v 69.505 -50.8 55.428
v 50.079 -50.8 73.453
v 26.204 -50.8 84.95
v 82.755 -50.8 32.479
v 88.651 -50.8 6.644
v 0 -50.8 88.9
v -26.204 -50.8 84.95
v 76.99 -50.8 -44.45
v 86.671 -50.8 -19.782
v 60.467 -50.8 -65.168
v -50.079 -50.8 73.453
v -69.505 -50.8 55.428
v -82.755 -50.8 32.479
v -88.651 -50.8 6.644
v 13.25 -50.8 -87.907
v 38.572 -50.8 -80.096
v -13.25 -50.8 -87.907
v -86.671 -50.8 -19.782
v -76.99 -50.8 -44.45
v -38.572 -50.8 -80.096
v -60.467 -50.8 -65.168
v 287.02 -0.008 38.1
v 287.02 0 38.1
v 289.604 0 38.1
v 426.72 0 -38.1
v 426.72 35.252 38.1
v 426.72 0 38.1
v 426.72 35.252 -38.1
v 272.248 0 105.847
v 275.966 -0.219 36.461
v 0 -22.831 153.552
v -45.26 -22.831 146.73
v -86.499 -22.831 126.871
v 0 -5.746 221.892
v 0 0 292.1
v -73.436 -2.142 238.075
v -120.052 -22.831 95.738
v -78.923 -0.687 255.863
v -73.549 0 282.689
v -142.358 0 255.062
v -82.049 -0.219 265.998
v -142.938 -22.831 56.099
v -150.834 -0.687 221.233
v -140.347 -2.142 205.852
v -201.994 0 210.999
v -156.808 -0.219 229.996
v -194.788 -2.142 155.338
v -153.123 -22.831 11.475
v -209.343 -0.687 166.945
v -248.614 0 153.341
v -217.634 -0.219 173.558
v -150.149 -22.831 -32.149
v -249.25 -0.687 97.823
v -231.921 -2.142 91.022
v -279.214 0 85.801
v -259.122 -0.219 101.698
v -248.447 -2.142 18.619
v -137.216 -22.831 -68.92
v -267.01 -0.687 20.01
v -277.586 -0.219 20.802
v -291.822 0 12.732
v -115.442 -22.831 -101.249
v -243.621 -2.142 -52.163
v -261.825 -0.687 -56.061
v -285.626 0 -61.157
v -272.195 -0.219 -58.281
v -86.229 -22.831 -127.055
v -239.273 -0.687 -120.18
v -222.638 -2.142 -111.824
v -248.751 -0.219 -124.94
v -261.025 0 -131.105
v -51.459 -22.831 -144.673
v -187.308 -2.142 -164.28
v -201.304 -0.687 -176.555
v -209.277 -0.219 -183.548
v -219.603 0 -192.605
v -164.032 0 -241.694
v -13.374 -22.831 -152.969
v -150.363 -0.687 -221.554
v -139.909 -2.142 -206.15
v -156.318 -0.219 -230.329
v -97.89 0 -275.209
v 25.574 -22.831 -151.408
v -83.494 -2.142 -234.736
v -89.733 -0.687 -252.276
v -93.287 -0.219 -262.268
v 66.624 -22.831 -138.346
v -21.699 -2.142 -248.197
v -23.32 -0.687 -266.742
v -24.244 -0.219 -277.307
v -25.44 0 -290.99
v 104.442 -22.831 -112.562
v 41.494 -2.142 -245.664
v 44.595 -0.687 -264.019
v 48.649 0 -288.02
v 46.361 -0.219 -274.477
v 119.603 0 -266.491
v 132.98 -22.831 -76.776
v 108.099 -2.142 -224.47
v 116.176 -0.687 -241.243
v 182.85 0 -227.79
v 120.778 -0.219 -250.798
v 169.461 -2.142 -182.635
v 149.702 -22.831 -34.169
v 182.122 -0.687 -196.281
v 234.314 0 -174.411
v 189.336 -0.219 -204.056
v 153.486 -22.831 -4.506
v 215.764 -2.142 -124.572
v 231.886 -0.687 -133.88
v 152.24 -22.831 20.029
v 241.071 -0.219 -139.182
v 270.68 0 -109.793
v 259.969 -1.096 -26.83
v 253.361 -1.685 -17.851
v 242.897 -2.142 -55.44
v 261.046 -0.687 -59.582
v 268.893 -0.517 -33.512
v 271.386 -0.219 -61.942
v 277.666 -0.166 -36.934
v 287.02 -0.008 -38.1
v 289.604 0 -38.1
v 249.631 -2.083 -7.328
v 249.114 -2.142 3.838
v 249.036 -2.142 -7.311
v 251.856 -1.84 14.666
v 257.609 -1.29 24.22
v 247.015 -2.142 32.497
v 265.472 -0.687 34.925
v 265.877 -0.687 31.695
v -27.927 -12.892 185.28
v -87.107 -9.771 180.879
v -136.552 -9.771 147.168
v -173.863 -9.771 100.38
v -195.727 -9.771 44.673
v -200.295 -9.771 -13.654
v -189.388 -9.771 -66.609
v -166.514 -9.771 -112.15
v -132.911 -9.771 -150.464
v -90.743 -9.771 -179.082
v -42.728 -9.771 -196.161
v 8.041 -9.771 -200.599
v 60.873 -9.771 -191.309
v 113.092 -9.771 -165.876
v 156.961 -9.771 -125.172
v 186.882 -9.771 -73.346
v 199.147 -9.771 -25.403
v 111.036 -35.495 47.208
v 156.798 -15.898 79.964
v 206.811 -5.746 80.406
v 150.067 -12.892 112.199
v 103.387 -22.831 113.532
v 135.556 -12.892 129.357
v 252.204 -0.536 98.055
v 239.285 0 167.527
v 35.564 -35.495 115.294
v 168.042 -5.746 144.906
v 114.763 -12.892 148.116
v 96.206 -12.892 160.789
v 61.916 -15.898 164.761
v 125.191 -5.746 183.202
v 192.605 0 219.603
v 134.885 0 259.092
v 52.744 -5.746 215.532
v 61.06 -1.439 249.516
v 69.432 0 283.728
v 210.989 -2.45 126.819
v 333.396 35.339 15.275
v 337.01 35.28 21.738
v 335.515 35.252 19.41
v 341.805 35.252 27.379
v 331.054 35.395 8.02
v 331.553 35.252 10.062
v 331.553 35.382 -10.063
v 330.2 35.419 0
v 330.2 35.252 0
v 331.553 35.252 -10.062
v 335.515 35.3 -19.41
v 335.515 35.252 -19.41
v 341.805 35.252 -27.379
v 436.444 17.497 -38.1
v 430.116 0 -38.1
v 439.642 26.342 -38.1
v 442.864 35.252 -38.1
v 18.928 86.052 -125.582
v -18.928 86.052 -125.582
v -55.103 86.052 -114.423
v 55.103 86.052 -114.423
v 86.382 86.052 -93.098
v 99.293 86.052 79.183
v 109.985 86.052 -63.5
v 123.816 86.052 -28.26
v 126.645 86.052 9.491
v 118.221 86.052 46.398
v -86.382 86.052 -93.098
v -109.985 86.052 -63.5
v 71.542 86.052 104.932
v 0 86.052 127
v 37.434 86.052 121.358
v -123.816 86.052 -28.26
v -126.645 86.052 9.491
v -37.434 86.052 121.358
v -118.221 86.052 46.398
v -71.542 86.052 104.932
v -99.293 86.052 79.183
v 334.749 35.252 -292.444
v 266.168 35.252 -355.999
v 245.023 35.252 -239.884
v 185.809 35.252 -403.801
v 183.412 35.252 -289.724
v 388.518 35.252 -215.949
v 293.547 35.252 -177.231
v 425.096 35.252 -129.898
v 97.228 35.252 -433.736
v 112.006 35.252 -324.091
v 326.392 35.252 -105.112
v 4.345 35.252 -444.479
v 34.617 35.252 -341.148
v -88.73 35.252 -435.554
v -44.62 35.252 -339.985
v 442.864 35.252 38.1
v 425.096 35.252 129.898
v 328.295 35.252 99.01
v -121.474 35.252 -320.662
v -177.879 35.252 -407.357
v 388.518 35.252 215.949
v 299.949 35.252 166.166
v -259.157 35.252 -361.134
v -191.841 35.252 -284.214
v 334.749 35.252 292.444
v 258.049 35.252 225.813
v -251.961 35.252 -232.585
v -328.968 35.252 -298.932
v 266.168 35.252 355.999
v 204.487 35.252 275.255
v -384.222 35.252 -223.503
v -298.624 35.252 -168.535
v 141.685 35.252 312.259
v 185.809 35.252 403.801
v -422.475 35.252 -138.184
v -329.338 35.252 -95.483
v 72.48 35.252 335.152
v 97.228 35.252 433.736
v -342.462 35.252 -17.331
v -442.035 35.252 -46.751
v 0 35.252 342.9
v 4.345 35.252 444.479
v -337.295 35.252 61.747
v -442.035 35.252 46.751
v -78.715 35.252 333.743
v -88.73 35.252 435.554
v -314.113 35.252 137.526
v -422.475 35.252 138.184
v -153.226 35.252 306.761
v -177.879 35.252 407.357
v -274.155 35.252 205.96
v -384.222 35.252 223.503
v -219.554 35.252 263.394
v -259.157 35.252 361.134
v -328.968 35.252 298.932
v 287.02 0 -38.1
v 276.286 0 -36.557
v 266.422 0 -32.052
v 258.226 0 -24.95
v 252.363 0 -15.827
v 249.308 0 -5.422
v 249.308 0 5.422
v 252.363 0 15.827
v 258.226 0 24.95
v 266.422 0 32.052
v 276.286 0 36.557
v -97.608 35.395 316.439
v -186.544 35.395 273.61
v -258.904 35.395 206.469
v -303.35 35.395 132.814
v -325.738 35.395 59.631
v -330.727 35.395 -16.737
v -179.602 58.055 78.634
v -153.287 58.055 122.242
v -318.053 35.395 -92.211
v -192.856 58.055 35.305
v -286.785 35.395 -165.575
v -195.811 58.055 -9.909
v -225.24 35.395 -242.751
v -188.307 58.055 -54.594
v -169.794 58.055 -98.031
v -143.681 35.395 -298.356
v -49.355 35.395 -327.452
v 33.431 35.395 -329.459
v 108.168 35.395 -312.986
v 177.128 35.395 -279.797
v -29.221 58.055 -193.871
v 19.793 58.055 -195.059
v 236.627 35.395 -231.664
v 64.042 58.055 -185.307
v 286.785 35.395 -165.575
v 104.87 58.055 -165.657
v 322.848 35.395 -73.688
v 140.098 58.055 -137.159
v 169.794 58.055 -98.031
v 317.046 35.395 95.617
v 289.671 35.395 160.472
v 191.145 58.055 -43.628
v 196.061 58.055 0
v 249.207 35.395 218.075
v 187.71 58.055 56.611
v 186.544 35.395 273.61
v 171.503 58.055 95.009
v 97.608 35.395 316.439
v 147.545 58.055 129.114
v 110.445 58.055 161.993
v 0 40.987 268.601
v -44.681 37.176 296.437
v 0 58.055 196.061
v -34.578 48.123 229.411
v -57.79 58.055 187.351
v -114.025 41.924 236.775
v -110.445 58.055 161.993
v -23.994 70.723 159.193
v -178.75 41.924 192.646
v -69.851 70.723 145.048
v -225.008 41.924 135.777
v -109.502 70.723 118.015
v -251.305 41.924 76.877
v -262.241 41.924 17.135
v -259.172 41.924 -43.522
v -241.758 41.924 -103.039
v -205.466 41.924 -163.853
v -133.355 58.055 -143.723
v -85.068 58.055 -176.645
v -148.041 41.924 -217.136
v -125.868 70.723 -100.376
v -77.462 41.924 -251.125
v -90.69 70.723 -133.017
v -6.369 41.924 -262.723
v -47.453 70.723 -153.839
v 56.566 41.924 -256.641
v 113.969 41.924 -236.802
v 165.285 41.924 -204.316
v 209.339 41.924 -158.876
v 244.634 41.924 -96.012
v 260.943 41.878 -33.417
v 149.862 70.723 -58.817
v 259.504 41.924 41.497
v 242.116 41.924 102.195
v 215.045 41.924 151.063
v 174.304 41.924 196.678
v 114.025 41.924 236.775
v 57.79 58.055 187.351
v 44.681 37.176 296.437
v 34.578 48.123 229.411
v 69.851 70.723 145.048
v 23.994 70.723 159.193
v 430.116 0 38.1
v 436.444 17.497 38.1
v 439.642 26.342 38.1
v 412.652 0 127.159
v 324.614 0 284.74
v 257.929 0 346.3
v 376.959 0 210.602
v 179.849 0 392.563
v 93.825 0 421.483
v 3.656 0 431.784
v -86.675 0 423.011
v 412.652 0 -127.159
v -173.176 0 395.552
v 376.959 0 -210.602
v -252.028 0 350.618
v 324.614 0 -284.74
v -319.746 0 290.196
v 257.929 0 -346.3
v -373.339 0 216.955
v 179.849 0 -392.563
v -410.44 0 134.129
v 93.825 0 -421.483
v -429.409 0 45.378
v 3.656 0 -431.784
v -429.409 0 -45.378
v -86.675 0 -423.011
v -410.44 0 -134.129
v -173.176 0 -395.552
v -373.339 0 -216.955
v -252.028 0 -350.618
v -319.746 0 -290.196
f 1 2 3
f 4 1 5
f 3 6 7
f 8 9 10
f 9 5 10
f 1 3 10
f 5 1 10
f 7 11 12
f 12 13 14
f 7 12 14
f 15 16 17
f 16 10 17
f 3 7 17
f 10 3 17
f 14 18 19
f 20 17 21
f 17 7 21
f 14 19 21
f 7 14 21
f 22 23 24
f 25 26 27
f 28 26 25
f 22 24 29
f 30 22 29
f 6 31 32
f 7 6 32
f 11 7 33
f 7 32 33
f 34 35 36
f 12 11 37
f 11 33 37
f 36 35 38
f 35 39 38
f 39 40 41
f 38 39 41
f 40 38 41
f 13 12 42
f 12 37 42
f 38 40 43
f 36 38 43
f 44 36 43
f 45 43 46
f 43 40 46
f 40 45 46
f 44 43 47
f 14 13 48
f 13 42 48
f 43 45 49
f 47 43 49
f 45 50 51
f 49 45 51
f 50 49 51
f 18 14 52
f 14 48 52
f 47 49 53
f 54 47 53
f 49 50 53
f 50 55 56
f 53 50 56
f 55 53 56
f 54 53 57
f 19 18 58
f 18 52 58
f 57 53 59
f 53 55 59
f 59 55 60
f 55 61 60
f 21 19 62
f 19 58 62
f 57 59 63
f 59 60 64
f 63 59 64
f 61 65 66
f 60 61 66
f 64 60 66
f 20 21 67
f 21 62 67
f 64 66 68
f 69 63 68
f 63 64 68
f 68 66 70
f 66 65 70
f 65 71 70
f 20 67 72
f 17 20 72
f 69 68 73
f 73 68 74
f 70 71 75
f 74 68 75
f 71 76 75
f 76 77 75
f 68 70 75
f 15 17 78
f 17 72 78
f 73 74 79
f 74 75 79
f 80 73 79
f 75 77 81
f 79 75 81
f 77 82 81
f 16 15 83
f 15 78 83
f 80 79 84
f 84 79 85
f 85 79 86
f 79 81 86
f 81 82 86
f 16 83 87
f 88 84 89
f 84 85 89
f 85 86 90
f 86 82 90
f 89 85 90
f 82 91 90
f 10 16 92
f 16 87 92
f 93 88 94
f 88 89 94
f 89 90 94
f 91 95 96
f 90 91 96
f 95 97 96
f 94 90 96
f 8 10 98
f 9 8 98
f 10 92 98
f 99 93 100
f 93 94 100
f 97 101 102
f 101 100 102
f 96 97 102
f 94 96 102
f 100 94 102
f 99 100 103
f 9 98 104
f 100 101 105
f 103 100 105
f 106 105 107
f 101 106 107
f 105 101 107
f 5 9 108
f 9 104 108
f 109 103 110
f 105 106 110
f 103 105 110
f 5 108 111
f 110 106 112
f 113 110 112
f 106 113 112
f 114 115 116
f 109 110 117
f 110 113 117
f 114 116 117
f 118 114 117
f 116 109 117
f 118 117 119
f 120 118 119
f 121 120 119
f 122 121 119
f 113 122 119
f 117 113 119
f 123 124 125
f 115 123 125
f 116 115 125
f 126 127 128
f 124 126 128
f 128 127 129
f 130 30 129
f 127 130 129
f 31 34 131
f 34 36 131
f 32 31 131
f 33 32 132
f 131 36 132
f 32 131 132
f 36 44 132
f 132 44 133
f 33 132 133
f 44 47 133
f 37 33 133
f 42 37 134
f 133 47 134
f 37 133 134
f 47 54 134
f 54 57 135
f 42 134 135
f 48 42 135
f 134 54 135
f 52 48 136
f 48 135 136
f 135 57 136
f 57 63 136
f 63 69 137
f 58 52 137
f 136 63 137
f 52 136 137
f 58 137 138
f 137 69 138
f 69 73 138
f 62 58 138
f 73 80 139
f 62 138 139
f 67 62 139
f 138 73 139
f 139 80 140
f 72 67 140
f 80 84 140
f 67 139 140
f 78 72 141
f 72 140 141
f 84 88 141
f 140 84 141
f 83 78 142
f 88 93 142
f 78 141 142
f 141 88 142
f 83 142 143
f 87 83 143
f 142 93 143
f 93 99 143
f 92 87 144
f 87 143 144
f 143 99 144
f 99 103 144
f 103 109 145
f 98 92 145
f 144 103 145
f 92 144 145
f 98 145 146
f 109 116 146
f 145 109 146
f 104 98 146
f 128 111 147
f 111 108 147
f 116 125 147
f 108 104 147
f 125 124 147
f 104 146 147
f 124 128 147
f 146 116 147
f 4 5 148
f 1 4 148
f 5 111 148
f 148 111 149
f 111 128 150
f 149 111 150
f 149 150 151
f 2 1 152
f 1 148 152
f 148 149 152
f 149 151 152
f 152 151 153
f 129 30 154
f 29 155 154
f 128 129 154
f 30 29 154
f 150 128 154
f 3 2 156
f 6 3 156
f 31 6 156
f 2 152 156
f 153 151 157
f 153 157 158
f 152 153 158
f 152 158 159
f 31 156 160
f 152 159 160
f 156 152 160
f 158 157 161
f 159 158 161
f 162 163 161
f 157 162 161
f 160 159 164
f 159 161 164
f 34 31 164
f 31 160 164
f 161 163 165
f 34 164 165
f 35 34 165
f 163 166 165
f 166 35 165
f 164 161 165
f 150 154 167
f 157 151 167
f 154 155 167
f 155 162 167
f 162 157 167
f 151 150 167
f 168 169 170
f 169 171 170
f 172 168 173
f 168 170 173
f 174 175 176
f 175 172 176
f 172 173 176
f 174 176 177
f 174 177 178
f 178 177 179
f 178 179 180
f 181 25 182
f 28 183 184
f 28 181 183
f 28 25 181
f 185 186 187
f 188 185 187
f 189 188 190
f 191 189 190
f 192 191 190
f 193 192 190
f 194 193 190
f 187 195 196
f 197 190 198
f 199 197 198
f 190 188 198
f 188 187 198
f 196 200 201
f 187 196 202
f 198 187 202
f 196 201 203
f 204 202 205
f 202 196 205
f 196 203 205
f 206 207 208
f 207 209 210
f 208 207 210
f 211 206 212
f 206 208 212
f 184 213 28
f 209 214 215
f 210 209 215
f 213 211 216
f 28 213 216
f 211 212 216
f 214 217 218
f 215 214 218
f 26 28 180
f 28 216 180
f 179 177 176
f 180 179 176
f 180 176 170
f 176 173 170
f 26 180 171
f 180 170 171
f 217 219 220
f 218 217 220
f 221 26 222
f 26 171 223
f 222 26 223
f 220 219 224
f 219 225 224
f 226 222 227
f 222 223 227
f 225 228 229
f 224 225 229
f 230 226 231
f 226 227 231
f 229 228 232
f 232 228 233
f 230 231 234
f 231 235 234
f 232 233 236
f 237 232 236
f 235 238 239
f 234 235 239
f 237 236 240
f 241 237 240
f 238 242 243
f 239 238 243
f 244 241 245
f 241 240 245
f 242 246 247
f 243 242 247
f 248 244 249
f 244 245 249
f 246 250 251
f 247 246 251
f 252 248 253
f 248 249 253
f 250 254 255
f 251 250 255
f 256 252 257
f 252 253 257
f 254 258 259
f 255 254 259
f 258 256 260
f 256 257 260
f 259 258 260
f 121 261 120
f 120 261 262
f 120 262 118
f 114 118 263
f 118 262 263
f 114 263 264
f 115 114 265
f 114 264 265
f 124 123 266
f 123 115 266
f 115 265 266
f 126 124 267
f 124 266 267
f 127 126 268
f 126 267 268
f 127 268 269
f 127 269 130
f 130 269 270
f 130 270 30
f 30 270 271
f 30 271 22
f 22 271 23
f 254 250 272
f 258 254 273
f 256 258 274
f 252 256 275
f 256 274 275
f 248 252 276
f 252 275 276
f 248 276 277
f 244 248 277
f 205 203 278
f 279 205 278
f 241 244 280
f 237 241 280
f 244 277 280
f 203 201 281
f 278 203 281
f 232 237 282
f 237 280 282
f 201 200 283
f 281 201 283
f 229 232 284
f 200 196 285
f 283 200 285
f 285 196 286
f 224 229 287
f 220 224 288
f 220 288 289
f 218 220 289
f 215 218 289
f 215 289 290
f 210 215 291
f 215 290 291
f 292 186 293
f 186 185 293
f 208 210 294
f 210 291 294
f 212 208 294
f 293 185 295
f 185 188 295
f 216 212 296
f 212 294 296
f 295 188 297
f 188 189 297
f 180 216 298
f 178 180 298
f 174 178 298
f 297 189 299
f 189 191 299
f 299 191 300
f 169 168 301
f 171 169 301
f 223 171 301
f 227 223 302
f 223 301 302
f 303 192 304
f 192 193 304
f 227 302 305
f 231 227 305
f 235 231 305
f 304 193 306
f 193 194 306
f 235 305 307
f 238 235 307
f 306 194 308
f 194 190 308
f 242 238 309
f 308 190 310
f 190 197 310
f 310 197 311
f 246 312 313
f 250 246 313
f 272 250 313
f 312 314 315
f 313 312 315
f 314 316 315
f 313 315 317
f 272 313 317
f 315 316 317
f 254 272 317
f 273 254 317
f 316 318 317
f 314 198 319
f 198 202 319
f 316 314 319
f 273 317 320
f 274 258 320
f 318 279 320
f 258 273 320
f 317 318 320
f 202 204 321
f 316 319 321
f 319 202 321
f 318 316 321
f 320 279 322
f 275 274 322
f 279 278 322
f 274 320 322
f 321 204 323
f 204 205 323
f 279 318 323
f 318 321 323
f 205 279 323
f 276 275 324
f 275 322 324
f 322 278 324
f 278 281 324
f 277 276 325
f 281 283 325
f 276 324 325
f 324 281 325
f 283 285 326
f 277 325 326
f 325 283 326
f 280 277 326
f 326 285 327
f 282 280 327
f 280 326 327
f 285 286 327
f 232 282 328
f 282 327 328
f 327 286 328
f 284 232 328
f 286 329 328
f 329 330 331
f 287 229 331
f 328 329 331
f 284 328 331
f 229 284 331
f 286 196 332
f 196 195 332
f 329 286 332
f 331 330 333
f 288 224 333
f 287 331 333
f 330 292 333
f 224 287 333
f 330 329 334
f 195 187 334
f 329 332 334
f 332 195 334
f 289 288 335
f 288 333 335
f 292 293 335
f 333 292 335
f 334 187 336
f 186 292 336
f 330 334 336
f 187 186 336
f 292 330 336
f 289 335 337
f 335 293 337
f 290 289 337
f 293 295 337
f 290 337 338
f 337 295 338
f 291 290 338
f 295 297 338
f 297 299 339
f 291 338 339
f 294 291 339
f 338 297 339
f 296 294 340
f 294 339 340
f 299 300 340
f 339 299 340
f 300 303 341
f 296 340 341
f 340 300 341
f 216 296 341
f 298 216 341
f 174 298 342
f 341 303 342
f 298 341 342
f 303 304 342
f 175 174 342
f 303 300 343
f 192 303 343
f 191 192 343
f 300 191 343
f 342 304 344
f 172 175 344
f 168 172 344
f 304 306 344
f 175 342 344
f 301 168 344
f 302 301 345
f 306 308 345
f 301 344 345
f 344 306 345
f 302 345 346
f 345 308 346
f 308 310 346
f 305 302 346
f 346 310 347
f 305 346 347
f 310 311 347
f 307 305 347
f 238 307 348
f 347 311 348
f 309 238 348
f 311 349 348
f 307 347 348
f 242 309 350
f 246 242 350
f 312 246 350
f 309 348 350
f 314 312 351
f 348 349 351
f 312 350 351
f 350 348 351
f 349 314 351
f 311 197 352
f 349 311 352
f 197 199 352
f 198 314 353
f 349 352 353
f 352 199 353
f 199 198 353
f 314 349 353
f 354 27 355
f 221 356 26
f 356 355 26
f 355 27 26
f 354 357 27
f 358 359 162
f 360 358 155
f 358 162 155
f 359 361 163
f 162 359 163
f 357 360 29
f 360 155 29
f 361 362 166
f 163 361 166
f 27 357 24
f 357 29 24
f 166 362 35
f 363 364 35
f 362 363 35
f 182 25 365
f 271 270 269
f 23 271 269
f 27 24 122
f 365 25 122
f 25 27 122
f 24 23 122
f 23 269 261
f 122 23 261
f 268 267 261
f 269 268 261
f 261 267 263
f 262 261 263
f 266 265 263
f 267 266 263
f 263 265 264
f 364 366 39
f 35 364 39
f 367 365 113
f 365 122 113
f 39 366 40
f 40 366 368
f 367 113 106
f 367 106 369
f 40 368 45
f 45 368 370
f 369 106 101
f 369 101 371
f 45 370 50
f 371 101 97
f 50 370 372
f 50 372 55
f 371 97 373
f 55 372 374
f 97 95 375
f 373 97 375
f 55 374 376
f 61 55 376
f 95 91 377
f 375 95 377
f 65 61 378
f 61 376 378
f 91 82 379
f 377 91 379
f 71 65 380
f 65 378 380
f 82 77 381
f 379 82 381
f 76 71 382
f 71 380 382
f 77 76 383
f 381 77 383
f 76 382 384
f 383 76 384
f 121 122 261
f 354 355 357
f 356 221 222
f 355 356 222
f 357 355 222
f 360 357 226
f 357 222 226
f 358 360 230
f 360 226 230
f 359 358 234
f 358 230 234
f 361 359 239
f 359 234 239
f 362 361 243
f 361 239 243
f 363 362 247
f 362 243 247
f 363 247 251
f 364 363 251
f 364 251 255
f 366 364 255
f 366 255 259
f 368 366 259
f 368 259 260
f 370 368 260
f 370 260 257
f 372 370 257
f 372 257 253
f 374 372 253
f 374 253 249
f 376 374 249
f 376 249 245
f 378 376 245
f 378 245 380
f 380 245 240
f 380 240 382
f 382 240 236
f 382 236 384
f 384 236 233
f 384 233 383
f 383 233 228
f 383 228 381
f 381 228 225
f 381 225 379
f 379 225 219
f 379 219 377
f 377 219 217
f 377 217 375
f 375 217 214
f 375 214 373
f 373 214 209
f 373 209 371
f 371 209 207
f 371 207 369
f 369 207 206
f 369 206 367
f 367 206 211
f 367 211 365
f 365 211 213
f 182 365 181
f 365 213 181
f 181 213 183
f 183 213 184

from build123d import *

# Parameters (mm, degrees)
SKETCH3_W          = 76.2
SKETCH3_H          = 35.252279458
CUT_EXTRUDE1_DEPTH = 982.839871475
CUT_EXTRUDE2_DEPTH = 635.48049207
CUT_EXTRUDE3_DEPTH = 635.48049207


with BuildPart() as part:
    # Sketch2 → Revolve3 (revolve)
    with BuildSketch(Plane.XY, mode=Mode.PRIVATE) as revolve3_sk:
        with BuildLine():
            Line((431.799904354, 0), (444.5, 35.252279458))
            Line((444.5, 35.252279458), (342.9, 35.252279458))
            ThreePointArc((342.9, 35.252279458), (232.002017602, 48.123354266), (127, 86.052279458))
            Line((127, 86.052279458), (0, 86.052279458))
            Line((0, 86.052279458), (0, 0))
            Line((0, 0), (0, -50.8))
            Line((0, -50.8), (88.9, -50.8))
            ThreePointArc((88.9, -50.8), (187.373067859, -12.892468613), (292.099904354, 0))
            Line((292.099904354, 0), (431.799904354, 0))
        make_face()
    revolve(revolve3_sk.sketch.rotate(Axis((0, 86.052279458, 0), (0, -1, 0)), 90), axis=Axis((0, 86.052279458, 0), (0, -1, 0)))

    # Sketch3 → Cut-Extrude1 (cut, through all)
    with BuildSketch(Plane(origin=(426.72, 0, 0), x_dir=(0, 0, -1), z_dir=(1, 0, 0))):
        with Locations((0, 17.626139729)):
            Rectangle(SKETCH3_W, SKETCH3_H)
    extrude(amount=CUT_EXTRUDE1_DEPTH, mode=Mode.SUBTRACT)

    # Sketch4 → Cut-Extrude2 (cut, through all)
    with BuildSketch(Plane(origin=(0, 35.252279458, 0), x_dir=(1, 0, 0), z_dir=(0, 1, 0))):
        with BuildLine():
            Line((426.72, -38.1), (368.3, -38.1))
            ThreePointArc((368.3, -38.1), (330.2, 0), (368.3, 38.1))
            Line((368.3, 38.1), (426.72, 38.1))
            Line((426.72, 38.1), (426.72, -38.1))
        make_face()
    extrude(amount=CUT_EXTRUDE2_DEPTH, mode=Mode.SUBTRACT)

    # Sketch5 → Cut-Extrude3 (cut, through all)
    with BuildSketch(Plane.XZ):
        with BuildLine():
            Line((426.72, -38.1), (287.02, -38.1))
            ThreePointArc((287.02, -38.1), (248.92, 0), (287.02, 38.1))
            Line((287.02, 38.1), (426.72, 38.1))
            Line((426.72, 38.1), (426.72, -38.1))
        make_face()
    extrude(amount=CUT_EXTRUDE3_DEPTH, mode=Mode.SUBTRACT)


solid = part.part
